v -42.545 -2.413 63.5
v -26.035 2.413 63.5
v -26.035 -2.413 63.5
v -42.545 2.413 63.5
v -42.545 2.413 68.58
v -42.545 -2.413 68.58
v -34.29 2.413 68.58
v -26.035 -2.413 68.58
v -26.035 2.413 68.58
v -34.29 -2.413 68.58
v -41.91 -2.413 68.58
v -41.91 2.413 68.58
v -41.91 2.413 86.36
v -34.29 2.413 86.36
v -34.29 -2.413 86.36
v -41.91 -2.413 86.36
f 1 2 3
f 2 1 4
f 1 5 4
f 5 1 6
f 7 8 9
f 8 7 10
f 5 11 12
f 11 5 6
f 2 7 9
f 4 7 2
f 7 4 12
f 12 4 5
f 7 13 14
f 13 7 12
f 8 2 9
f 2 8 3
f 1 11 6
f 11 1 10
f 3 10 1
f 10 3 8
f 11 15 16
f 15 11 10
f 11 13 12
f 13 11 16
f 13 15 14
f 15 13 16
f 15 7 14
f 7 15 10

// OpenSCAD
// file: lionpair.scad
//ViewScale = [0.0254, 0.0254, 0.0254];
 
baseHeight=16;
clipHeight=78;

module LionPair()
{
    linear_extrude(2600)
    union() { circle(354, $fn=96); translate([714, 0, 0]) circle(354, $fn=96); }
}

module termbase()
{
    union() {
        translate([-250, 0, 0]) square([500, 986], center=true);
        circle(493, $fn=96);
    }
}

module negative(comp)
{
    linear_extrude(baseHeight){
    *translate([450, 0, 0]) {
        square([700, 140], center=true);
        translate([350, 0, 0]) circle(70, $fn=96);
    }
    difference() {
        termbase();
        circle(64, $fn=96);
    }
    }
    translate([0, 0, comp/2]) cylinder(h=comp, r1=375, r2=290, center=true, $fn=96);
}

module positive()
{
    linear_extrude(baseHeight) termbase();
    translate([0, 0, 36]) cylinder(h=72, r1=270, r2=190, center=true, $fn=96);
}


module bits() {
    color("cornflowerblue") {
    negative(500);
    translate([0, 0, 3180]) rotate([180, 0, 0]) positive();
    translate([-714, 0, 500]) LionPair();
    }
}
// main file
use <lionpair.scad>
ViewScale = [0.0254, 0.0254, 0.0254];

module lowerShoe(ext)
{
    union(){
    // bottom layer
    linear_extrude(68)
    difference() {
        union() {
            translate([-250, 0, 0]) square([500, 1116], center=true);
            circle(558, $fn=96);
        }
        union() {
            translate([-350, 0, 0]) square([700, 1016], center=true);
            circle(508, $fn=96);
            translate([500, 0, 0]) square([150, 150], center=true);
        }
    }
    // top layer
    translate([0, 0, 68])
    linear_extrude(ext)
    difference() {
        union() {
            translate([-250, 0, 0]) square([500, 1116], center=true);
            circle(558, $fn=96);
        }
        union() {
            translate([-350, 0, 0]) square([700, 916], center=true);
            circle(458, $fn=96);
//            translate([500, 0, 0]) square([150, 150], center=true);
        }
    }}
}

module lower()
{
    translate([0, 0, 100]) lowerShoe(2650);
    linear_extrude(100)
    hull() {
        translate([-714, 0, 0]) circle(558, $fn=96);
        circle(558, $fn=96);
    }
    translate([0, 0, 0]) square(200, 300);
}

module boardCover()
{
}

module upper()
{
    rotate([180, 0, 0])
    {
        // shoe for charging board
        translate([-435, 0, -300])
        linear_extrude(225){
            translate([0, -400, 0]) square([880, 50], center=true);
            translate([0, 400, 0]) square([880, 50], center=true);

            translate([465, 325, 0]) square([50, 200], center=true);
            translate([-465, 325, 0]) square([50, 200], center=true);

            translate([465, -325, 0]) square([50, 200], center=true);
            translate([-465, -325, 0]) square([50, 200], center=true);

        }
        translate([-440, 0, -200])
        linear_extrude(100)
        square([880,780], center=true);

        lowerShoe(150);
        translate([0, 0, -100])
        linear_extrude(100)
        hull() {
            translate([-714, 0, 0]) circle(558, $fn=96);
            circle(558, $fn=96);
        }

        // sticky out bit for hinge
        translate([700, 0, -100])
        linear_extrude(300)
        union() {
            translate([0, 200, 0]) square([500, 200], center=true);
            translate([0, -200, 0]) square([500, 200], center=true);
        }

        // sticky out bit for catch
        translate([-1400, 0, 200])
        rotate([0, 180, 0])
        linear_extrude(300)
        union() {
            translate([0, 200, 0]) square([500, 200], center=true);
            translate([0, -200, 0]) square([500, 200], center=true);
        }
    }
}

module rib(hh)
{
    linear_extrude(hh)
    union() {
    difference() {
        hull() union() { circle(558, $fn=96); translate([714, 0, 0]) circle(558, $fn=96); }
        union() {
            hull() union() { circle(394, $fn=96); translate([714, 0, 0]) circle(394, $fn=96); }
            translate([-458, 0, 0]) square([200, 100], center=true);
        }
    }
    //translate([357, -608, 0]) square([200, 100], center=true);
    }
}


scale(ViewScale)
{
*    translate([0, 0, 100]) bits();
*    translate([0, 0, 3288]) upper();

    // the catch
    translate([-1400, 0, 2500])
    union() {
        linear_extrude(200) translate([50, 0, 0]) square([650, 190], center=true);
        translate([-100, 0, 200]) linear_extrude(700) square([300, 190], center=true);
    }

//    lower();
//    // sticky out bit for the upper hinge
//    translate([673, 0, 2600])
//    union() {
//        linear_extrude(200) translate([30, 0, 0]) square([500, 190], center=true);
//        //linear_extrude(200) square([550, 190], center=true);
//        translate([125, 0, 200]) linear_extrude(600) square([300, 190], center=true);
//    }
//
//    translate([0, 0, 750]) rotate([0, 0, 180]) rib(100);
//    translate([0, 0, 1750]) rotate([0, 0, 180]) rib(100);
//    translate([0, 0, 2750]) rotate([0, 0, 180]) rib(300);
//    // spine that sticks out
//    linear_extrude(2850) translate([-357, 608, 0]) square([280, 100], center=true);
//
//    // spine that goes in
//    linear_extrude(2850) translate([-57, -608, 0]) square([200, 100], center=true);
//    linear_extrude(2850) translate([-557, -608, 0]) square([200, 100], center=true);
}
